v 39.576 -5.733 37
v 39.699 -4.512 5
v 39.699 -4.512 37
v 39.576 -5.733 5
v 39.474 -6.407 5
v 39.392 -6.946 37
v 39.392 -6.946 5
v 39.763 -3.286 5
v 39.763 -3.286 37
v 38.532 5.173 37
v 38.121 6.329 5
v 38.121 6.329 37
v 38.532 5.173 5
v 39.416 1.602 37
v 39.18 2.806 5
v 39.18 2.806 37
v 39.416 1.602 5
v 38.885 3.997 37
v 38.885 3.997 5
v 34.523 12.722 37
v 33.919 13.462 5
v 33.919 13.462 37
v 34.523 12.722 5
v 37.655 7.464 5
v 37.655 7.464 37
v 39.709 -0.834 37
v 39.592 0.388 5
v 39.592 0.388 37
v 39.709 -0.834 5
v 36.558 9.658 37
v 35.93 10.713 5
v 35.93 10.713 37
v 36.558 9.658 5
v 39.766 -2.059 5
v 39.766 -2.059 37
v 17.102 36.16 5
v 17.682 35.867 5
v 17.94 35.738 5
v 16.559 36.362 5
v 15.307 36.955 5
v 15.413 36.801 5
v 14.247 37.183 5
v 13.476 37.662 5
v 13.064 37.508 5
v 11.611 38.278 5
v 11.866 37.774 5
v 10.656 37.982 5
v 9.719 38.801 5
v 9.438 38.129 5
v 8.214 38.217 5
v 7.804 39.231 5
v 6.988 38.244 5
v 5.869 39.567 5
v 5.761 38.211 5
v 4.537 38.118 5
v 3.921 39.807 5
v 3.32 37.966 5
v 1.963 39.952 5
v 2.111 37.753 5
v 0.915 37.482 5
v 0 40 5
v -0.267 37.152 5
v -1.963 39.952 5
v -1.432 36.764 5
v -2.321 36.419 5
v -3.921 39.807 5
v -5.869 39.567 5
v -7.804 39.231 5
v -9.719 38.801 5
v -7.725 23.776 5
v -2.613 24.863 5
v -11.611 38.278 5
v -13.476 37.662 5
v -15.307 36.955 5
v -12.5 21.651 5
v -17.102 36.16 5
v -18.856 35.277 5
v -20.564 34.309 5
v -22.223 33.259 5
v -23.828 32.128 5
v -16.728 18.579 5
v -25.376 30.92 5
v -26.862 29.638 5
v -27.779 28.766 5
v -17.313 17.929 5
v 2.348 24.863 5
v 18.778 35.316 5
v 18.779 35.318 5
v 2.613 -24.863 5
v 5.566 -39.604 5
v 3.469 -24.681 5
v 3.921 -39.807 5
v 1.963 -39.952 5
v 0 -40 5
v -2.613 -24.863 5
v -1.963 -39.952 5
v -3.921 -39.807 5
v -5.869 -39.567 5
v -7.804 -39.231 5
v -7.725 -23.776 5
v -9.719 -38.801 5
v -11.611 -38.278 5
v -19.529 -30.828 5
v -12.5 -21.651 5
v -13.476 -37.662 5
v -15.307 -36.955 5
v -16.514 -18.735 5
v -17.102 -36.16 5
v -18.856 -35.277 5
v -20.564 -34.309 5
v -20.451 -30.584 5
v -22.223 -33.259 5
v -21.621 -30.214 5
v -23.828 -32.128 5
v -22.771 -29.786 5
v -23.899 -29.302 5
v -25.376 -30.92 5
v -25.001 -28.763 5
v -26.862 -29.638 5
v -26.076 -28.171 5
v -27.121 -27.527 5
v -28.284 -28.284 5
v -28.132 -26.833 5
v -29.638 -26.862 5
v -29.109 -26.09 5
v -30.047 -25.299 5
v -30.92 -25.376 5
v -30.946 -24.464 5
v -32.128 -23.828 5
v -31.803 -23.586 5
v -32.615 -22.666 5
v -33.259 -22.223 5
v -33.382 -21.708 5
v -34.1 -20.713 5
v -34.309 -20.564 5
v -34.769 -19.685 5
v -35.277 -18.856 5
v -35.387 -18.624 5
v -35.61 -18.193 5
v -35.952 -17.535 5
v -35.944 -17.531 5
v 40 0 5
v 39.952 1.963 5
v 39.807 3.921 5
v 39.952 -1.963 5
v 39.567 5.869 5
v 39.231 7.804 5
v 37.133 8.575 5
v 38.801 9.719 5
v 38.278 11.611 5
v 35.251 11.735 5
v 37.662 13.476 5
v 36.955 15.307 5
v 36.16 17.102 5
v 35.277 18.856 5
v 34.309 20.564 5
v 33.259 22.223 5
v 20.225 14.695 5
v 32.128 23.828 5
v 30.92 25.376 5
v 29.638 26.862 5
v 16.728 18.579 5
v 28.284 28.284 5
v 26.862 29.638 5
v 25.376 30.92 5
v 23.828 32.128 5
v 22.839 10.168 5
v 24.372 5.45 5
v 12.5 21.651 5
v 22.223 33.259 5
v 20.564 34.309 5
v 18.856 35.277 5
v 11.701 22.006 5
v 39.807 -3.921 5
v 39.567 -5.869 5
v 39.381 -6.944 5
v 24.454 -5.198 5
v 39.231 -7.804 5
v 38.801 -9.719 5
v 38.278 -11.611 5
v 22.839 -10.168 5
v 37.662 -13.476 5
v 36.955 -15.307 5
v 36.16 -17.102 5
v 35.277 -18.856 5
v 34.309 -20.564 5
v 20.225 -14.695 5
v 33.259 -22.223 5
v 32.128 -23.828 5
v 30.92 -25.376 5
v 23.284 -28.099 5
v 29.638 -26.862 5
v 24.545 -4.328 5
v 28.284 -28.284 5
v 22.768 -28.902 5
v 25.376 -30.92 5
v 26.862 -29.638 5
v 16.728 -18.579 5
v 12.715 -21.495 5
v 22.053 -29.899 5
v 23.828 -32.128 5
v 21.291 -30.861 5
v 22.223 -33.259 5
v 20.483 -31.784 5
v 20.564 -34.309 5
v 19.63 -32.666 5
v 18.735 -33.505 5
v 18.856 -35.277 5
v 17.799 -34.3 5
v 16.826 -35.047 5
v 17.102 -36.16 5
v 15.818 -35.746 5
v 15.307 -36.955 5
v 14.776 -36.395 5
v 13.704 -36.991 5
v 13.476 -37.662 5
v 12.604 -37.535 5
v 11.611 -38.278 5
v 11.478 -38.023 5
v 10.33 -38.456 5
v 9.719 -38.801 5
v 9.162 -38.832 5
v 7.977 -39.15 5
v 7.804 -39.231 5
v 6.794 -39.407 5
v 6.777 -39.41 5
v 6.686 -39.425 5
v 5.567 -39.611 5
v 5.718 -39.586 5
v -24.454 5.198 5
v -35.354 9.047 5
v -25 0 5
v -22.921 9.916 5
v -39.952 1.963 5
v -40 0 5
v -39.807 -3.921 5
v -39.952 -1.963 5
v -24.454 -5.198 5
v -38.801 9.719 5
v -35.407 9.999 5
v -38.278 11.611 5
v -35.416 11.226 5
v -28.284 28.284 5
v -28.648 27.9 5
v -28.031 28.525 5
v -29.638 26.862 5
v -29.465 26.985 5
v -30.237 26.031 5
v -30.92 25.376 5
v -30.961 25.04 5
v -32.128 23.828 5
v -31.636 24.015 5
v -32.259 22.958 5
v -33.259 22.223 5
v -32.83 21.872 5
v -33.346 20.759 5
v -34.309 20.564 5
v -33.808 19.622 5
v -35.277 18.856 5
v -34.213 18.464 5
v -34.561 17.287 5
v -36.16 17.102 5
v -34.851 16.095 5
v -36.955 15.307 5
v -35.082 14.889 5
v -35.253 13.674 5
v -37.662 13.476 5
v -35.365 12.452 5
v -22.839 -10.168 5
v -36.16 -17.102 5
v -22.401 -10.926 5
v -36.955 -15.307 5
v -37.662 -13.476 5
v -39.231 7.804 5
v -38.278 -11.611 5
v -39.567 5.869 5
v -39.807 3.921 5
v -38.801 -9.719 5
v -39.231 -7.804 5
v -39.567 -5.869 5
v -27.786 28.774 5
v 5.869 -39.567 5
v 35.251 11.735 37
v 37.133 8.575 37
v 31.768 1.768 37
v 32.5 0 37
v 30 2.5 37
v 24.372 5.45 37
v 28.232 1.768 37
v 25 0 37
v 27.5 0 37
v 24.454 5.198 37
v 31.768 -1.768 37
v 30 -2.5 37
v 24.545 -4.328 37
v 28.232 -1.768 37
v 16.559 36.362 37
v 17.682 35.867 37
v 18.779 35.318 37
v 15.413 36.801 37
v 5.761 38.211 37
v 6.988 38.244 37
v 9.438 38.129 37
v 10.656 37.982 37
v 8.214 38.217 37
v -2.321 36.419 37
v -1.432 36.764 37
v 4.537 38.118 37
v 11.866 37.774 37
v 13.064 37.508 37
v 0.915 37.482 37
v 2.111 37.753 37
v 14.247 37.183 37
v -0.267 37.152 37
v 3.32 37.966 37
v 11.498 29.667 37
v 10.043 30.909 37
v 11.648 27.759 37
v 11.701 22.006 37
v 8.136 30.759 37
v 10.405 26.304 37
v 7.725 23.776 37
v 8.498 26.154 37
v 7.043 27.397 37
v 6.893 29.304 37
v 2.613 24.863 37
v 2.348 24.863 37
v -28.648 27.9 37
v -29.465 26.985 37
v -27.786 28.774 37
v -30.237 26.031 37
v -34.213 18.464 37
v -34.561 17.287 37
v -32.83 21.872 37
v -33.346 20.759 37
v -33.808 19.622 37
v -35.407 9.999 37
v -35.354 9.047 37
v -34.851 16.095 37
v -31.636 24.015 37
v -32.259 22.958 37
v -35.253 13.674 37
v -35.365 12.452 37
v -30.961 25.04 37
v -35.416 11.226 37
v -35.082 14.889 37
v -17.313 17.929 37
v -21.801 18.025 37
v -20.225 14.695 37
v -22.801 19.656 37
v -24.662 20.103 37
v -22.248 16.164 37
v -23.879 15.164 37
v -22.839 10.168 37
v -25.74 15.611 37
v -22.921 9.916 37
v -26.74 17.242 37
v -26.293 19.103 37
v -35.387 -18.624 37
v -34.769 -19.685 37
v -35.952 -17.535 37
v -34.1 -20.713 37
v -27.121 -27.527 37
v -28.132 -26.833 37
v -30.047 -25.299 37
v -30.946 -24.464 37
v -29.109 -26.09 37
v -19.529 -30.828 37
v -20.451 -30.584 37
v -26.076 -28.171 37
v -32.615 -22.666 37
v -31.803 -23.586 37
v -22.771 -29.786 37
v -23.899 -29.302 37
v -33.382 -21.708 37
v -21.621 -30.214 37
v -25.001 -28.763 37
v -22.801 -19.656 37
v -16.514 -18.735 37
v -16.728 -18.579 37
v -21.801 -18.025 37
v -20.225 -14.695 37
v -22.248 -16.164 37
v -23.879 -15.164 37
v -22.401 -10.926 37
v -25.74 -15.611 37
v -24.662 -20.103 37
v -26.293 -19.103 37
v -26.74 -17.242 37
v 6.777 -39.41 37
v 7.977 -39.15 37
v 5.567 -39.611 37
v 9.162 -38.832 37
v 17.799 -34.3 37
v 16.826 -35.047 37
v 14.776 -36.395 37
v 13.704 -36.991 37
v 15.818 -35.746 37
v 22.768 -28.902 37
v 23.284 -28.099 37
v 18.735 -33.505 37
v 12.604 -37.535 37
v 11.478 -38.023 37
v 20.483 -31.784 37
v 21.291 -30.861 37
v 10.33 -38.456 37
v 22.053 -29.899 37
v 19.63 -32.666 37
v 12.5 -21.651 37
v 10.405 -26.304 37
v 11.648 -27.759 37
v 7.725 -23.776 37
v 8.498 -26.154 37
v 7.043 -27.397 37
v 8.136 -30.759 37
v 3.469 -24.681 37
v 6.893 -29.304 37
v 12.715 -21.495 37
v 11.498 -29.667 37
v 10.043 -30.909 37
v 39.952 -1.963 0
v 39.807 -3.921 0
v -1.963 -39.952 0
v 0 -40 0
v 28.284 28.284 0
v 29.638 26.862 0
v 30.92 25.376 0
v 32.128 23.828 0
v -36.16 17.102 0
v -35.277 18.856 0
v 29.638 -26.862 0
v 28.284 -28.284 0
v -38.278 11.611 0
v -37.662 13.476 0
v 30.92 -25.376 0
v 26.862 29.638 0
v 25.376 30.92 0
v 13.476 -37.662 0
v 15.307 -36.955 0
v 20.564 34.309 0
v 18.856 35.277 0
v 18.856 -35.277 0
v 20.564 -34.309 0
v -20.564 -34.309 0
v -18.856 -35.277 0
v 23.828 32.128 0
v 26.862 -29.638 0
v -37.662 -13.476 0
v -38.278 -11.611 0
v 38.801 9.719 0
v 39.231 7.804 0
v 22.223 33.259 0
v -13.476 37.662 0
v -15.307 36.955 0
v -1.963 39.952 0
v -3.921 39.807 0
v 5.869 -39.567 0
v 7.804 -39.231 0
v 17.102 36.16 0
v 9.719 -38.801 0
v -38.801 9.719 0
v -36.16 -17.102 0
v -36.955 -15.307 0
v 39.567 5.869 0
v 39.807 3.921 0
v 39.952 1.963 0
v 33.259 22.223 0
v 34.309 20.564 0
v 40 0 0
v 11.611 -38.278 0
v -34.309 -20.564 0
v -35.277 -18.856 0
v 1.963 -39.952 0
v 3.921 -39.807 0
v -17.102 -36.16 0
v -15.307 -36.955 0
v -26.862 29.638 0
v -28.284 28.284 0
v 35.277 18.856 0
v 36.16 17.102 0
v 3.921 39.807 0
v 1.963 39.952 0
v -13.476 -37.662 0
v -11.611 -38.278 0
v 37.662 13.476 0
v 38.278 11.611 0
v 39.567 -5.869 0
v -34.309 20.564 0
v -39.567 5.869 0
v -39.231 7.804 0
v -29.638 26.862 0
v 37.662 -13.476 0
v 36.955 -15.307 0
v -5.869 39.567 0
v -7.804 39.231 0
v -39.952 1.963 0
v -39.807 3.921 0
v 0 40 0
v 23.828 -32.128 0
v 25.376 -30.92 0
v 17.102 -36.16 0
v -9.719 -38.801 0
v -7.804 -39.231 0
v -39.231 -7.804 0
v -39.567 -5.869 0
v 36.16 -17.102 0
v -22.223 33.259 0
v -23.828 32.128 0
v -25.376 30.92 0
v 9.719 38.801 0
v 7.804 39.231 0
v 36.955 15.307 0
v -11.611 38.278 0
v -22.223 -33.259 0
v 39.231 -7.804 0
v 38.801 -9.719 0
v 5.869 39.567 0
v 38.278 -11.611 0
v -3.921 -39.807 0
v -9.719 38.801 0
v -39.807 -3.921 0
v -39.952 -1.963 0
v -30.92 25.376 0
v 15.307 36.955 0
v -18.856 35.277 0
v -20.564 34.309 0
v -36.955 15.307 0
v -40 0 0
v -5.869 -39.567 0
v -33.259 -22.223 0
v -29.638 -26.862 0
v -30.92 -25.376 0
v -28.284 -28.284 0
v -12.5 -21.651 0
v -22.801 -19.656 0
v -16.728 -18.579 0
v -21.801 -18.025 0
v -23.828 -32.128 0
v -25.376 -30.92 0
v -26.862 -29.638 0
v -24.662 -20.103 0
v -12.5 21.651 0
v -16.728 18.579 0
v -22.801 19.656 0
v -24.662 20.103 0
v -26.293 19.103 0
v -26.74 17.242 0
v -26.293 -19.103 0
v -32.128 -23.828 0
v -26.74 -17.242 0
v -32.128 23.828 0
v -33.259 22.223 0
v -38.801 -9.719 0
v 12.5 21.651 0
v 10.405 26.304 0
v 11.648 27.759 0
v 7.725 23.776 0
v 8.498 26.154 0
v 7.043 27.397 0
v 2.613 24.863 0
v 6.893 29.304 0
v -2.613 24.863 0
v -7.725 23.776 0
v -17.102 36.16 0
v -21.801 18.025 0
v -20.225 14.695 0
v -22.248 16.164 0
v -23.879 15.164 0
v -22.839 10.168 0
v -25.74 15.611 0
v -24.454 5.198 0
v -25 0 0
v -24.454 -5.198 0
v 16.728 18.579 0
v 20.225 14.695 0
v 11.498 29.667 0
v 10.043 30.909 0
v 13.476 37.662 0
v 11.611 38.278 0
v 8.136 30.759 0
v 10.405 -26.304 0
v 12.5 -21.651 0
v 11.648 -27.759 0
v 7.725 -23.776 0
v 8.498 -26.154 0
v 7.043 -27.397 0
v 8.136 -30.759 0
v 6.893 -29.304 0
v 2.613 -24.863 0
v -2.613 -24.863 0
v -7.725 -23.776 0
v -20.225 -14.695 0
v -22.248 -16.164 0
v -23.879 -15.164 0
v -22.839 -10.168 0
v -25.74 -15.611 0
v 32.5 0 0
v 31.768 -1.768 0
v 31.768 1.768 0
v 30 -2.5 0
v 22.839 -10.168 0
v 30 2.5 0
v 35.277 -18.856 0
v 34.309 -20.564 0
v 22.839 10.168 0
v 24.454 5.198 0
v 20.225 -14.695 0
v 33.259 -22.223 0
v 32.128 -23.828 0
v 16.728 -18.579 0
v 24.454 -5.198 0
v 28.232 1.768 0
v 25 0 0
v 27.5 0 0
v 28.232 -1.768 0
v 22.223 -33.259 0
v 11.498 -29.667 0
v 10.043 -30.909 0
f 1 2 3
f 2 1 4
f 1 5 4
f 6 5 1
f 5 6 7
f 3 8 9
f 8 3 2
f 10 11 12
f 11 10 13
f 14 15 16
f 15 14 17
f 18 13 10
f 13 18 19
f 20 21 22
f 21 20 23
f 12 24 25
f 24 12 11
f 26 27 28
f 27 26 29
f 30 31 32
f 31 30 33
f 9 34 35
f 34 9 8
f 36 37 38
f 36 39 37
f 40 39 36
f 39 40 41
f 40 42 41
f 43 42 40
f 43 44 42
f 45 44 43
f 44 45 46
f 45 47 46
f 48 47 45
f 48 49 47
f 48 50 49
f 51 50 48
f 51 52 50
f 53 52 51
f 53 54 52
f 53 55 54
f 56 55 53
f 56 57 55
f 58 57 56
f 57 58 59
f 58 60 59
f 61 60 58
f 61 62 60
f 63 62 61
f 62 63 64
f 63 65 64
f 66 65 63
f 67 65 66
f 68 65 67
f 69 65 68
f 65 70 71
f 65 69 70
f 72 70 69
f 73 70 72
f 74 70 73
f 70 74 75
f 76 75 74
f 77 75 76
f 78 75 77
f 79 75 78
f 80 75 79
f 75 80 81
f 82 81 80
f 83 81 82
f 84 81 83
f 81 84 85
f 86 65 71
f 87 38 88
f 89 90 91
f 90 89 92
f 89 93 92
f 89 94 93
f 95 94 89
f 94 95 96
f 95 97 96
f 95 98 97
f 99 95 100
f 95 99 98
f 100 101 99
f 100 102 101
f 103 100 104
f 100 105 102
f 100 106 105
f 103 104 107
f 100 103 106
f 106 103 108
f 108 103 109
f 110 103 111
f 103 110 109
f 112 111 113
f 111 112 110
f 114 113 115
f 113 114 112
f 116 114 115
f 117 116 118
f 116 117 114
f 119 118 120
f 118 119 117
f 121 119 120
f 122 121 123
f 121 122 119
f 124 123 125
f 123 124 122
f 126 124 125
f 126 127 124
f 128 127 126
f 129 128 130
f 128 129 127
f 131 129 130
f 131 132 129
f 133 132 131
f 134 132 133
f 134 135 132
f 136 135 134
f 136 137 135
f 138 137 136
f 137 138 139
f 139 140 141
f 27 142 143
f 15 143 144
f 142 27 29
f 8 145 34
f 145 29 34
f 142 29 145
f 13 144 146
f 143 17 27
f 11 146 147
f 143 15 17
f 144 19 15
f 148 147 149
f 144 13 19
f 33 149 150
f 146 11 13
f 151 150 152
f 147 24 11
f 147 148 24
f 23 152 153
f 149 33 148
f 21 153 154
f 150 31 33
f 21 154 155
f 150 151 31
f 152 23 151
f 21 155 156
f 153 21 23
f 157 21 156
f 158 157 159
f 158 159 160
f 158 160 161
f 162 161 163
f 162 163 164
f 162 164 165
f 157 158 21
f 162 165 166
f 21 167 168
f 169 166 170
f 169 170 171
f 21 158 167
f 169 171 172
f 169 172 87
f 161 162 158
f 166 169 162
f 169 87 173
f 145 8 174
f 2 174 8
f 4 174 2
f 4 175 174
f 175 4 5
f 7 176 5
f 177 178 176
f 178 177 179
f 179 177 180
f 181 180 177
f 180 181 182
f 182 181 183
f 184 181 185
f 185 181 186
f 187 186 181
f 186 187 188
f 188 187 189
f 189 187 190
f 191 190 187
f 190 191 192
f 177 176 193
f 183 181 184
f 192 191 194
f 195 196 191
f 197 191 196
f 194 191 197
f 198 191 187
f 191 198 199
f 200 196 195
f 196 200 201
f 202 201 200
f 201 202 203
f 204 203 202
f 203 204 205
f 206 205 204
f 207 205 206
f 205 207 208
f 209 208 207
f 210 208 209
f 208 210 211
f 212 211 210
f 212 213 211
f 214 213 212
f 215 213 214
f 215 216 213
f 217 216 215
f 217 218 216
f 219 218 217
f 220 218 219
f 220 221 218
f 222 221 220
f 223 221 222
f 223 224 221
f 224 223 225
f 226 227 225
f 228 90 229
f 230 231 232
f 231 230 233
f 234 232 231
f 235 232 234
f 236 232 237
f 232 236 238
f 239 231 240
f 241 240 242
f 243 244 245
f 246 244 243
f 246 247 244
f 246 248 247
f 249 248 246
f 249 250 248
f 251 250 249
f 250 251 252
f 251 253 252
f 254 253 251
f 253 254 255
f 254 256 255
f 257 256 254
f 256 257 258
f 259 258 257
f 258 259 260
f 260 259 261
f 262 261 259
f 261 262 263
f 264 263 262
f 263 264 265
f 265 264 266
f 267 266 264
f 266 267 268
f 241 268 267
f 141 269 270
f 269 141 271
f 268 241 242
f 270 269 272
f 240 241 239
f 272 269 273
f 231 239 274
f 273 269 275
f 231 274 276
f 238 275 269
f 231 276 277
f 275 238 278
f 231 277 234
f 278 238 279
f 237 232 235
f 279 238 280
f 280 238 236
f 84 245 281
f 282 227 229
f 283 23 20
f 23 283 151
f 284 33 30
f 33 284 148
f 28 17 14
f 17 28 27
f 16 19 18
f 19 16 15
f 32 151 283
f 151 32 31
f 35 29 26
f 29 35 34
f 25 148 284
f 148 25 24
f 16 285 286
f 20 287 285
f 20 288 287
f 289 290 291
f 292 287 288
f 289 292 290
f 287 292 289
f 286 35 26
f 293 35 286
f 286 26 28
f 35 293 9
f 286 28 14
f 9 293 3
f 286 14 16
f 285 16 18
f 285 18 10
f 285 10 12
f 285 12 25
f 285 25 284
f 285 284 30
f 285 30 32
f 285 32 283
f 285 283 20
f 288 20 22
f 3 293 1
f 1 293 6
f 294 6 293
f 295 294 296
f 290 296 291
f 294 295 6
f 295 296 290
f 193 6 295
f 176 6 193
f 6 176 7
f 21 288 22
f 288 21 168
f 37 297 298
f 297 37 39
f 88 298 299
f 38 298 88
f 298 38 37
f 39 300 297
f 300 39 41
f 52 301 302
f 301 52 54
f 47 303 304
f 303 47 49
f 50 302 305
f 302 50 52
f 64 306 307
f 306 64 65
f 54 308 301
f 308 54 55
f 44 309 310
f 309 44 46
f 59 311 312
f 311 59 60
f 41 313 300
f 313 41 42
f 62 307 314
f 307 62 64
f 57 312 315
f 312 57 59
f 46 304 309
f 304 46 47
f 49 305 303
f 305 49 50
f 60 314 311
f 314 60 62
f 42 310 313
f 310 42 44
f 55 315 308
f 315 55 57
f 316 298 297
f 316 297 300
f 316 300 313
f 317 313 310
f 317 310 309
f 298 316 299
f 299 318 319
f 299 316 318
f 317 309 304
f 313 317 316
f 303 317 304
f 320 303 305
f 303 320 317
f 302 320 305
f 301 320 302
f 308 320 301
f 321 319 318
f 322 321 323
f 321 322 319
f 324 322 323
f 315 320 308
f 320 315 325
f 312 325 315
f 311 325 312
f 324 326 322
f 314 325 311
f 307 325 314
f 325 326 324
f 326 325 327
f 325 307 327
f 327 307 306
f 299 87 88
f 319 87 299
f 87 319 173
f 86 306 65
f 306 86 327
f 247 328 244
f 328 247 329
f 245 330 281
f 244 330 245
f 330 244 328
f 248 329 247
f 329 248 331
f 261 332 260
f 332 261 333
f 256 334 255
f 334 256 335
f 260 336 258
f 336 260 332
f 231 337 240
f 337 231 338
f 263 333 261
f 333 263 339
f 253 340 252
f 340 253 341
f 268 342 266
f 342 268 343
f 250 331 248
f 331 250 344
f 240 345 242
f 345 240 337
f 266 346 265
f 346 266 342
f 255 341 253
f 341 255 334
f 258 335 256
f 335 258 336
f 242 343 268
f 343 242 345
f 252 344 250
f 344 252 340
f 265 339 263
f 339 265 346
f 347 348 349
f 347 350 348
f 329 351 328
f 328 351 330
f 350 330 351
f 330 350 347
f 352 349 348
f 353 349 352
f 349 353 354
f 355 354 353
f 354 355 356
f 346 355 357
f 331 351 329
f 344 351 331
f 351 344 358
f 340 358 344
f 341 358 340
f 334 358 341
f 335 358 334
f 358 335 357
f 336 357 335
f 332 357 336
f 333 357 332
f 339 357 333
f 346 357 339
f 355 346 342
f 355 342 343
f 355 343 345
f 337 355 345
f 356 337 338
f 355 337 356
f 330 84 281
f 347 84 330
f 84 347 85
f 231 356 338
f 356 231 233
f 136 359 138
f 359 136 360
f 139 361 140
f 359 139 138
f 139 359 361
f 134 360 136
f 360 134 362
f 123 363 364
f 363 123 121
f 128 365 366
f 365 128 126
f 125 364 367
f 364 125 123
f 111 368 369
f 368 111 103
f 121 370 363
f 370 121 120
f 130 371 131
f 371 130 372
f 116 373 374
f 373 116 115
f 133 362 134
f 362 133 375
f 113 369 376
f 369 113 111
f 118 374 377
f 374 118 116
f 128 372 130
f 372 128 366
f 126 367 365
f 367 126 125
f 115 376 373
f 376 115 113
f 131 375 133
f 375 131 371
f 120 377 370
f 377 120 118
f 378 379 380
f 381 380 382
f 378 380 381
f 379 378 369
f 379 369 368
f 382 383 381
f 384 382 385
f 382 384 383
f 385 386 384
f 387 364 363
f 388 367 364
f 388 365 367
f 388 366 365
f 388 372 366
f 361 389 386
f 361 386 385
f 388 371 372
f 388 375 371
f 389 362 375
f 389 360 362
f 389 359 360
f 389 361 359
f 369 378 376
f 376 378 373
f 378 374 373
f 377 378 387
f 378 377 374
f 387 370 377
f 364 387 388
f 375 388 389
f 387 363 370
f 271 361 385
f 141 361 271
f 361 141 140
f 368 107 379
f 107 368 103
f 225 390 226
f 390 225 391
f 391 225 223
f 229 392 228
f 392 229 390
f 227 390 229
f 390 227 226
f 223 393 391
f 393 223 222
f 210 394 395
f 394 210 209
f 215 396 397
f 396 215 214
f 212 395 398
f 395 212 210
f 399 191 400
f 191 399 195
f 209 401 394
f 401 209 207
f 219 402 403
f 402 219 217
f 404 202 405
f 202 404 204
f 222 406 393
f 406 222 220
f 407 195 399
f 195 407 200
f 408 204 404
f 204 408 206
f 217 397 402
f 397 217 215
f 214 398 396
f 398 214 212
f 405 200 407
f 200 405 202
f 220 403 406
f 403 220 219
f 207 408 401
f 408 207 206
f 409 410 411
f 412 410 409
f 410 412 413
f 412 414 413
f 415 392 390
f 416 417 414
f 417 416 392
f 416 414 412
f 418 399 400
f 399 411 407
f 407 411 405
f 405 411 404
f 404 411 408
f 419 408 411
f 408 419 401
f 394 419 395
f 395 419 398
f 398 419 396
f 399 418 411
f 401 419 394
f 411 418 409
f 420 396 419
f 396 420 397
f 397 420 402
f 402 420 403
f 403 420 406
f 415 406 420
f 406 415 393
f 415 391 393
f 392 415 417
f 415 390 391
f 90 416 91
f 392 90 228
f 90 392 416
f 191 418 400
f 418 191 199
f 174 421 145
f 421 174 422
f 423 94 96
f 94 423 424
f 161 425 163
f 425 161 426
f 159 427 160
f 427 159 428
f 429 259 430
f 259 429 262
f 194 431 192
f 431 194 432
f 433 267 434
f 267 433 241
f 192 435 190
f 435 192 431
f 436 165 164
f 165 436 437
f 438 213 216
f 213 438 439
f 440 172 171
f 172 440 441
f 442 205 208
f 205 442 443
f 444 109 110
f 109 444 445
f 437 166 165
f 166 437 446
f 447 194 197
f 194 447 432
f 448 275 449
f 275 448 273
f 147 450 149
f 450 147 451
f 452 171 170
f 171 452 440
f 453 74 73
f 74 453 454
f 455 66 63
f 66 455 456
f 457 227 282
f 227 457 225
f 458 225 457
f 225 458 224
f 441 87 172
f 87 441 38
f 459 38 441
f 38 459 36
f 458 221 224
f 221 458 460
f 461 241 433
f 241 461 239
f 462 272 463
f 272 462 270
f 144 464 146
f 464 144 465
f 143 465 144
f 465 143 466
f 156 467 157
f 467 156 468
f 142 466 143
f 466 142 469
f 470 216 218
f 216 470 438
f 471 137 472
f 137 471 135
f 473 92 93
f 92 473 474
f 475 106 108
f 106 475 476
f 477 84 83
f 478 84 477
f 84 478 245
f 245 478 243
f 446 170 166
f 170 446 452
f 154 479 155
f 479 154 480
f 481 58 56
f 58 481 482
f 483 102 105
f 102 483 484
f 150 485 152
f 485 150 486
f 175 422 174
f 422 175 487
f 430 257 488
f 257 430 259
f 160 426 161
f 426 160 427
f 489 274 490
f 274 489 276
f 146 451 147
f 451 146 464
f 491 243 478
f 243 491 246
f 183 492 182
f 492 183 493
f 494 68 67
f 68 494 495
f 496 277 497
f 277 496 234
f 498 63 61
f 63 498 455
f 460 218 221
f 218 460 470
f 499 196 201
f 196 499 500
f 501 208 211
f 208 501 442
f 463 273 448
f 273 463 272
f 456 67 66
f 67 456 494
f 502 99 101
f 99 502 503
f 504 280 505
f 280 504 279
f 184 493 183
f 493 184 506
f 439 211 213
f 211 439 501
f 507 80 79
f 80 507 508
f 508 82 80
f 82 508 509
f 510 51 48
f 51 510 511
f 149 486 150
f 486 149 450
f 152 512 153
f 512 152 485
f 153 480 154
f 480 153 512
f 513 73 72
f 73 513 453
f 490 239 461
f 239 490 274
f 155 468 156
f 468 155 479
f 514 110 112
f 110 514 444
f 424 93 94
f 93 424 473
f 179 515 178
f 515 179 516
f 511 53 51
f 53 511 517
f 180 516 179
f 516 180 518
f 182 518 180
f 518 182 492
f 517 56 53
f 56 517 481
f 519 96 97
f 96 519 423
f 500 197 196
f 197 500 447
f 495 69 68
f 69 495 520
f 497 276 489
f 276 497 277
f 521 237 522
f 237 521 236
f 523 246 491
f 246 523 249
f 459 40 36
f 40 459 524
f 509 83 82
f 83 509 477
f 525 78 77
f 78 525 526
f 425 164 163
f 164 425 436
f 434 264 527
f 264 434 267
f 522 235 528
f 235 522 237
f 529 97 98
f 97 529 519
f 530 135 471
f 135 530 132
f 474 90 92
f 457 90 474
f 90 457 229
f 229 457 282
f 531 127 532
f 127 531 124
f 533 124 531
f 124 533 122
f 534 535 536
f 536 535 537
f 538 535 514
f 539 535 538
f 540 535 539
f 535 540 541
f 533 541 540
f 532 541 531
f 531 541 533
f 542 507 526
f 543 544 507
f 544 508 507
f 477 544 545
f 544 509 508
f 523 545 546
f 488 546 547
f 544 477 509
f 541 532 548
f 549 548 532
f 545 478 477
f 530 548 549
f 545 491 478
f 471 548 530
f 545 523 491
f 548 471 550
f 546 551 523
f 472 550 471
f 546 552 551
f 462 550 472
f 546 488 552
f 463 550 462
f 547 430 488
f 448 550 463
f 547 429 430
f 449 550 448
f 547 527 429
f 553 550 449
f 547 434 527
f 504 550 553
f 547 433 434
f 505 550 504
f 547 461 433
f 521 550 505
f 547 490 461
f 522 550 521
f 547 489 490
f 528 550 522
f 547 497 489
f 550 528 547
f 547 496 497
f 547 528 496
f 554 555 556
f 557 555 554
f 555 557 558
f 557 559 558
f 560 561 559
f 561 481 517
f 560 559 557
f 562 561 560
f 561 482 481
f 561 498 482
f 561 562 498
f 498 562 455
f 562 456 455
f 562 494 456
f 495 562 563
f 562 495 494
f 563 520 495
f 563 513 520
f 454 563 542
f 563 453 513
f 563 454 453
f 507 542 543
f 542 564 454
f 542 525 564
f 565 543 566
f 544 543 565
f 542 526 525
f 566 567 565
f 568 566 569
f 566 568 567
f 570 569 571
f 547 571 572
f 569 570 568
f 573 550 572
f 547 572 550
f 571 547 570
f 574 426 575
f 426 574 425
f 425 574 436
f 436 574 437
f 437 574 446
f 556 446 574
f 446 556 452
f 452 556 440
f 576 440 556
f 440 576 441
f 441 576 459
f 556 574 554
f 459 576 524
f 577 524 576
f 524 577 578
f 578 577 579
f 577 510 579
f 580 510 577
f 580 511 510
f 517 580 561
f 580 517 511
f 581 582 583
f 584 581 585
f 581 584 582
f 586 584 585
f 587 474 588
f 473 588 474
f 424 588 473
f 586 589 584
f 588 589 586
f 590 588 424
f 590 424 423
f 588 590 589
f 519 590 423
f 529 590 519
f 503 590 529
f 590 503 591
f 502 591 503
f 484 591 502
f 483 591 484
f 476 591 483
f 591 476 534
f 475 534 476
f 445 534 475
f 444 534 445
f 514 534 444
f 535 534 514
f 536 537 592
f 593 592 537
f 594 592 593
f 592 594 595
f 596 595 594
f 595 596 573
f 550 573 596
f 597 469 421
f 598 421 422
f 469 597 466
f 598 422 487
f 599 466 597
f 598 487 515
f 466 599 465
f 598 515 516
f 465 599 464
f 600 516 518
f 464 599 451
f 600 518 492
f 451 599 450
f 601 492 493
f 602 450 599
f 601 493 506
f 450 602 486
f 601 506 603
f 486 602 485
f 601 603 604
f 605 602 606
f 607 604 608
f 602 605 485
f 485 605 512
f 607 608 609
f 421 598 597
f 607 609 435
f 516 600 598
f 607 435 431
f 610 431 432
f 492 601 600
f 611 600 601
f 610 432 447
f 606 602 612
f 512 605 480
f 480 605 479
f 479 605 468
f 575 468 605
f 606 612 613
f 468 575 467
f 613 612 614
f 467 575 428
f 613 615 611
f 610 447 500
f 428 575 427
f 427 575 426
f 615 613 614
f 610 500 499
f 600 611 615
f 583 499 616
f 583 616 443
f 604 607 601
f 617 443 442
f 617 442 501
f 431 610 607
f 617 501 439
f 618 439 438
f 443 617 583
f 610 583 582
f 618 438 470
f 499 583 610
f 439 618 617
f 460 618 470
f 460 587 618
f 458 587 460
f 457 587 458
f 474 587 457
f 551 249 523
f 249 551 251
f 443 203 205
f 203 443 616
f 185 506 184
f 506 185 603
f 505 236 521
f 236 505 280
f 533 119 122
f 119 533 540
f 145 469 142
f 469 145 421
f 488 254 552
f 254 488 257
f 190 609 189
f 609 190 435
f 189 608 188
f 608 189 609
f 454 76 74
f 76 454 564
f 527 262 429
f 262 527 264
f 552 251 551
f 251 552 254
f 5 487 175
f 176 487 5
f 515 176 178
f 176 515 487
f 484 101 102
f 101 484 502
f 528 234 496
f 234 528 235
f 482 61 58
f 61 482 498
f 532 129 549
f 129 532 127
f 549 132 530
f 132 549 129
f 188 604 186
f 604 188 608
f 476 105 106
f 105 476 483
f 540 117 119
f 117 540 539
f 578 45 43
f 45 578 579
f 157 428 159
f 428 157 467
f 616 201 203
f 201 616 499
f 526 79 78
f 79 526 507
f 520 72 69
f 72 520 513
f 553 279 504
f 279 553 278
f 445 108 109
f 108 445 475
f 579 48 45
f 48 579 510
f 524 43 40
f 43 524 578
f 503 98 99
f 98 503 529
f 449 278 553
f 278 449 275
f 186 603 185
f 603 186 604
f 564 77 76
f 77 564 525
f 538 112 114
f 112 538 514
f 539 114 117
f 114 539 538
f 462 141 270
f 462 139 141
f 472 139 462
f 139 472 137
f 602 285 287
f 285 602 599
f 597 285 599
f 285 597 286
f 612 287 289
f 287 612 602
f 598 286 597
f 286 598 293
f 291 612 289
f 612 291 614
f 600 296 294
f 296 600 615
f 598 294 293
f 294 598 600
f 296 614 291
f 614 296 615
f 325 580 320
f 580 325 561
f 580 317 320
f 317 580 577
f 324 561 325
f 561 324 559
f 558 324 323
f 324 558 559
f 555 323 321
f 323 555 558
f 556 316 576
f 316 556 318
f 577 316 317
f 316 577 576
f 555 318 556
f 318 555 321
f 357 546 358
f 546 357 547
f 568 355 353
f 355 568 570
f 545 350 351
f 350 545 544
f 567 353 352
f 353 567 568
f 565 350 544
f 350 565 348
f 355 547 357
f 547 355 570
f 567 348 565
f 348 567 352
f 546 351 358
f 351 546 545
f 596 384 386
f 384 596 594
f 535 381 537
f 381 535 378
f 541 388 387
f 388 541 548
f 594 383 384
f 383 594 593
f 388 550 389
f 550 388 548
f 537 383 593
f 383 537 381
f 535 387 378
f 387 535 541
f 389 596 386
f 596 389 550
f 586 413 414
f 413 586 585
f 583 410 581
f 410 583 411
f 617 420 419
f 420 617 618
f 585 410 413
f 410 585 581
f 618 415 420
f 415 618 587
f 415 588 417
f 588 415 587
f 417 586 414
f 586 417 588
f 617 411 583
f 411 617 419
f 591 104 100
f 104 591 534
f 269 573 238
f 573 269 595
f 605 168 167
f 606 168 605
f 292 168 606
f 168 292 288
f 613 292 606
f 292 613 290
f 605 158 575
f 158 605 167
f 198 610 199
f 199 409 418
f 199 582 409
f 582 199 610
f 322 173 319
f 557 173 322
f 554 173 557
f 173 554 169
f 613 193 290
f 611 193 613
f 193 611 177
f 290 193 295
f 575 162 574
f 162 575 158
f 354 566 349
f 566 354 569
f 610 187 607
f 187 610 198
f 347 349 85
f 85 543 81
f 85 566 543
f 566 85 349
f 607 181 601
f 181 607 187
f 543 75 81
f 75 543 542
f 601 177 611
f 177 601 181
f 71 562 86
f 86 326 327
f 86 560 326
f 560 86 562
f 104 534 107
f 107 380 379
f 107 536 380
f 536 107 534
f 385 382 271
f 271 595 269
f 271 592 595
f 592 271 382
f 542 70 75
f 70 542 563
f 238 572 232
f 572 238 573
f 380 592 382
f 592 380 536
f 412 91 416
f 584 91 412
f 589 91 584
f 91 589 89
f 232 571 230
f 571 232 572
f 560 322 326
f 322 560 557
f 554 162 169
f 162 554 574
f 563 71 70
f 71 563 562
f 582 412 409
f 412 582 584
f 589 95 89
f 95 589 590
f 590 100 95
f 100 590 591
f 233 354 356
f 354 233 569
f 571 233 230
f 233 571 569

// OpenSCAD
supports=5;
m5_distance=30;
base_height=5;
support_height=32;

module pie_slice(r=3.0, h=10, a=30) {
  $fn=128;
  intersection() {
    cylinder(r=r, h=h, center=true);
    translate([0,0,-1*(h/2)]) cube([r,r,h + 0.1]);
    translate([0,0,-1*(h/2)]) rotate(a-90) cube([r,r,h + 0.1]);
  }
}

difference() {
    union() {
        translate([0, 0, base_height/2]) cylinder(r=m5_distance+10, h=base_height, center=true, $fn=128);
        for (i=[0:(360/supports):360]) {
            translate([0, 0, (support_height/2)+base_height]) {
                rotate([0,0,i-10]) translate([15,0,0]) pie_slice(r=25,h=support_height,a=50);
            }
        }
    }
    translate([0, 0, (base_height+support_height)/2]) union() {
        for (i=[0:(360/supports):360]) {
            rotate([0,0,i]) {
                translate([m5_distance, 0, 0]) {
                    cylinder(r=2.5, h=base_height+0.1+support_height, center=true);
                }
            }
        }
    }

    translate([0, 0, (base_height+support_height)/2]) cylinder(r=25, h=base_height+support_height+0.1, center=true);
}
